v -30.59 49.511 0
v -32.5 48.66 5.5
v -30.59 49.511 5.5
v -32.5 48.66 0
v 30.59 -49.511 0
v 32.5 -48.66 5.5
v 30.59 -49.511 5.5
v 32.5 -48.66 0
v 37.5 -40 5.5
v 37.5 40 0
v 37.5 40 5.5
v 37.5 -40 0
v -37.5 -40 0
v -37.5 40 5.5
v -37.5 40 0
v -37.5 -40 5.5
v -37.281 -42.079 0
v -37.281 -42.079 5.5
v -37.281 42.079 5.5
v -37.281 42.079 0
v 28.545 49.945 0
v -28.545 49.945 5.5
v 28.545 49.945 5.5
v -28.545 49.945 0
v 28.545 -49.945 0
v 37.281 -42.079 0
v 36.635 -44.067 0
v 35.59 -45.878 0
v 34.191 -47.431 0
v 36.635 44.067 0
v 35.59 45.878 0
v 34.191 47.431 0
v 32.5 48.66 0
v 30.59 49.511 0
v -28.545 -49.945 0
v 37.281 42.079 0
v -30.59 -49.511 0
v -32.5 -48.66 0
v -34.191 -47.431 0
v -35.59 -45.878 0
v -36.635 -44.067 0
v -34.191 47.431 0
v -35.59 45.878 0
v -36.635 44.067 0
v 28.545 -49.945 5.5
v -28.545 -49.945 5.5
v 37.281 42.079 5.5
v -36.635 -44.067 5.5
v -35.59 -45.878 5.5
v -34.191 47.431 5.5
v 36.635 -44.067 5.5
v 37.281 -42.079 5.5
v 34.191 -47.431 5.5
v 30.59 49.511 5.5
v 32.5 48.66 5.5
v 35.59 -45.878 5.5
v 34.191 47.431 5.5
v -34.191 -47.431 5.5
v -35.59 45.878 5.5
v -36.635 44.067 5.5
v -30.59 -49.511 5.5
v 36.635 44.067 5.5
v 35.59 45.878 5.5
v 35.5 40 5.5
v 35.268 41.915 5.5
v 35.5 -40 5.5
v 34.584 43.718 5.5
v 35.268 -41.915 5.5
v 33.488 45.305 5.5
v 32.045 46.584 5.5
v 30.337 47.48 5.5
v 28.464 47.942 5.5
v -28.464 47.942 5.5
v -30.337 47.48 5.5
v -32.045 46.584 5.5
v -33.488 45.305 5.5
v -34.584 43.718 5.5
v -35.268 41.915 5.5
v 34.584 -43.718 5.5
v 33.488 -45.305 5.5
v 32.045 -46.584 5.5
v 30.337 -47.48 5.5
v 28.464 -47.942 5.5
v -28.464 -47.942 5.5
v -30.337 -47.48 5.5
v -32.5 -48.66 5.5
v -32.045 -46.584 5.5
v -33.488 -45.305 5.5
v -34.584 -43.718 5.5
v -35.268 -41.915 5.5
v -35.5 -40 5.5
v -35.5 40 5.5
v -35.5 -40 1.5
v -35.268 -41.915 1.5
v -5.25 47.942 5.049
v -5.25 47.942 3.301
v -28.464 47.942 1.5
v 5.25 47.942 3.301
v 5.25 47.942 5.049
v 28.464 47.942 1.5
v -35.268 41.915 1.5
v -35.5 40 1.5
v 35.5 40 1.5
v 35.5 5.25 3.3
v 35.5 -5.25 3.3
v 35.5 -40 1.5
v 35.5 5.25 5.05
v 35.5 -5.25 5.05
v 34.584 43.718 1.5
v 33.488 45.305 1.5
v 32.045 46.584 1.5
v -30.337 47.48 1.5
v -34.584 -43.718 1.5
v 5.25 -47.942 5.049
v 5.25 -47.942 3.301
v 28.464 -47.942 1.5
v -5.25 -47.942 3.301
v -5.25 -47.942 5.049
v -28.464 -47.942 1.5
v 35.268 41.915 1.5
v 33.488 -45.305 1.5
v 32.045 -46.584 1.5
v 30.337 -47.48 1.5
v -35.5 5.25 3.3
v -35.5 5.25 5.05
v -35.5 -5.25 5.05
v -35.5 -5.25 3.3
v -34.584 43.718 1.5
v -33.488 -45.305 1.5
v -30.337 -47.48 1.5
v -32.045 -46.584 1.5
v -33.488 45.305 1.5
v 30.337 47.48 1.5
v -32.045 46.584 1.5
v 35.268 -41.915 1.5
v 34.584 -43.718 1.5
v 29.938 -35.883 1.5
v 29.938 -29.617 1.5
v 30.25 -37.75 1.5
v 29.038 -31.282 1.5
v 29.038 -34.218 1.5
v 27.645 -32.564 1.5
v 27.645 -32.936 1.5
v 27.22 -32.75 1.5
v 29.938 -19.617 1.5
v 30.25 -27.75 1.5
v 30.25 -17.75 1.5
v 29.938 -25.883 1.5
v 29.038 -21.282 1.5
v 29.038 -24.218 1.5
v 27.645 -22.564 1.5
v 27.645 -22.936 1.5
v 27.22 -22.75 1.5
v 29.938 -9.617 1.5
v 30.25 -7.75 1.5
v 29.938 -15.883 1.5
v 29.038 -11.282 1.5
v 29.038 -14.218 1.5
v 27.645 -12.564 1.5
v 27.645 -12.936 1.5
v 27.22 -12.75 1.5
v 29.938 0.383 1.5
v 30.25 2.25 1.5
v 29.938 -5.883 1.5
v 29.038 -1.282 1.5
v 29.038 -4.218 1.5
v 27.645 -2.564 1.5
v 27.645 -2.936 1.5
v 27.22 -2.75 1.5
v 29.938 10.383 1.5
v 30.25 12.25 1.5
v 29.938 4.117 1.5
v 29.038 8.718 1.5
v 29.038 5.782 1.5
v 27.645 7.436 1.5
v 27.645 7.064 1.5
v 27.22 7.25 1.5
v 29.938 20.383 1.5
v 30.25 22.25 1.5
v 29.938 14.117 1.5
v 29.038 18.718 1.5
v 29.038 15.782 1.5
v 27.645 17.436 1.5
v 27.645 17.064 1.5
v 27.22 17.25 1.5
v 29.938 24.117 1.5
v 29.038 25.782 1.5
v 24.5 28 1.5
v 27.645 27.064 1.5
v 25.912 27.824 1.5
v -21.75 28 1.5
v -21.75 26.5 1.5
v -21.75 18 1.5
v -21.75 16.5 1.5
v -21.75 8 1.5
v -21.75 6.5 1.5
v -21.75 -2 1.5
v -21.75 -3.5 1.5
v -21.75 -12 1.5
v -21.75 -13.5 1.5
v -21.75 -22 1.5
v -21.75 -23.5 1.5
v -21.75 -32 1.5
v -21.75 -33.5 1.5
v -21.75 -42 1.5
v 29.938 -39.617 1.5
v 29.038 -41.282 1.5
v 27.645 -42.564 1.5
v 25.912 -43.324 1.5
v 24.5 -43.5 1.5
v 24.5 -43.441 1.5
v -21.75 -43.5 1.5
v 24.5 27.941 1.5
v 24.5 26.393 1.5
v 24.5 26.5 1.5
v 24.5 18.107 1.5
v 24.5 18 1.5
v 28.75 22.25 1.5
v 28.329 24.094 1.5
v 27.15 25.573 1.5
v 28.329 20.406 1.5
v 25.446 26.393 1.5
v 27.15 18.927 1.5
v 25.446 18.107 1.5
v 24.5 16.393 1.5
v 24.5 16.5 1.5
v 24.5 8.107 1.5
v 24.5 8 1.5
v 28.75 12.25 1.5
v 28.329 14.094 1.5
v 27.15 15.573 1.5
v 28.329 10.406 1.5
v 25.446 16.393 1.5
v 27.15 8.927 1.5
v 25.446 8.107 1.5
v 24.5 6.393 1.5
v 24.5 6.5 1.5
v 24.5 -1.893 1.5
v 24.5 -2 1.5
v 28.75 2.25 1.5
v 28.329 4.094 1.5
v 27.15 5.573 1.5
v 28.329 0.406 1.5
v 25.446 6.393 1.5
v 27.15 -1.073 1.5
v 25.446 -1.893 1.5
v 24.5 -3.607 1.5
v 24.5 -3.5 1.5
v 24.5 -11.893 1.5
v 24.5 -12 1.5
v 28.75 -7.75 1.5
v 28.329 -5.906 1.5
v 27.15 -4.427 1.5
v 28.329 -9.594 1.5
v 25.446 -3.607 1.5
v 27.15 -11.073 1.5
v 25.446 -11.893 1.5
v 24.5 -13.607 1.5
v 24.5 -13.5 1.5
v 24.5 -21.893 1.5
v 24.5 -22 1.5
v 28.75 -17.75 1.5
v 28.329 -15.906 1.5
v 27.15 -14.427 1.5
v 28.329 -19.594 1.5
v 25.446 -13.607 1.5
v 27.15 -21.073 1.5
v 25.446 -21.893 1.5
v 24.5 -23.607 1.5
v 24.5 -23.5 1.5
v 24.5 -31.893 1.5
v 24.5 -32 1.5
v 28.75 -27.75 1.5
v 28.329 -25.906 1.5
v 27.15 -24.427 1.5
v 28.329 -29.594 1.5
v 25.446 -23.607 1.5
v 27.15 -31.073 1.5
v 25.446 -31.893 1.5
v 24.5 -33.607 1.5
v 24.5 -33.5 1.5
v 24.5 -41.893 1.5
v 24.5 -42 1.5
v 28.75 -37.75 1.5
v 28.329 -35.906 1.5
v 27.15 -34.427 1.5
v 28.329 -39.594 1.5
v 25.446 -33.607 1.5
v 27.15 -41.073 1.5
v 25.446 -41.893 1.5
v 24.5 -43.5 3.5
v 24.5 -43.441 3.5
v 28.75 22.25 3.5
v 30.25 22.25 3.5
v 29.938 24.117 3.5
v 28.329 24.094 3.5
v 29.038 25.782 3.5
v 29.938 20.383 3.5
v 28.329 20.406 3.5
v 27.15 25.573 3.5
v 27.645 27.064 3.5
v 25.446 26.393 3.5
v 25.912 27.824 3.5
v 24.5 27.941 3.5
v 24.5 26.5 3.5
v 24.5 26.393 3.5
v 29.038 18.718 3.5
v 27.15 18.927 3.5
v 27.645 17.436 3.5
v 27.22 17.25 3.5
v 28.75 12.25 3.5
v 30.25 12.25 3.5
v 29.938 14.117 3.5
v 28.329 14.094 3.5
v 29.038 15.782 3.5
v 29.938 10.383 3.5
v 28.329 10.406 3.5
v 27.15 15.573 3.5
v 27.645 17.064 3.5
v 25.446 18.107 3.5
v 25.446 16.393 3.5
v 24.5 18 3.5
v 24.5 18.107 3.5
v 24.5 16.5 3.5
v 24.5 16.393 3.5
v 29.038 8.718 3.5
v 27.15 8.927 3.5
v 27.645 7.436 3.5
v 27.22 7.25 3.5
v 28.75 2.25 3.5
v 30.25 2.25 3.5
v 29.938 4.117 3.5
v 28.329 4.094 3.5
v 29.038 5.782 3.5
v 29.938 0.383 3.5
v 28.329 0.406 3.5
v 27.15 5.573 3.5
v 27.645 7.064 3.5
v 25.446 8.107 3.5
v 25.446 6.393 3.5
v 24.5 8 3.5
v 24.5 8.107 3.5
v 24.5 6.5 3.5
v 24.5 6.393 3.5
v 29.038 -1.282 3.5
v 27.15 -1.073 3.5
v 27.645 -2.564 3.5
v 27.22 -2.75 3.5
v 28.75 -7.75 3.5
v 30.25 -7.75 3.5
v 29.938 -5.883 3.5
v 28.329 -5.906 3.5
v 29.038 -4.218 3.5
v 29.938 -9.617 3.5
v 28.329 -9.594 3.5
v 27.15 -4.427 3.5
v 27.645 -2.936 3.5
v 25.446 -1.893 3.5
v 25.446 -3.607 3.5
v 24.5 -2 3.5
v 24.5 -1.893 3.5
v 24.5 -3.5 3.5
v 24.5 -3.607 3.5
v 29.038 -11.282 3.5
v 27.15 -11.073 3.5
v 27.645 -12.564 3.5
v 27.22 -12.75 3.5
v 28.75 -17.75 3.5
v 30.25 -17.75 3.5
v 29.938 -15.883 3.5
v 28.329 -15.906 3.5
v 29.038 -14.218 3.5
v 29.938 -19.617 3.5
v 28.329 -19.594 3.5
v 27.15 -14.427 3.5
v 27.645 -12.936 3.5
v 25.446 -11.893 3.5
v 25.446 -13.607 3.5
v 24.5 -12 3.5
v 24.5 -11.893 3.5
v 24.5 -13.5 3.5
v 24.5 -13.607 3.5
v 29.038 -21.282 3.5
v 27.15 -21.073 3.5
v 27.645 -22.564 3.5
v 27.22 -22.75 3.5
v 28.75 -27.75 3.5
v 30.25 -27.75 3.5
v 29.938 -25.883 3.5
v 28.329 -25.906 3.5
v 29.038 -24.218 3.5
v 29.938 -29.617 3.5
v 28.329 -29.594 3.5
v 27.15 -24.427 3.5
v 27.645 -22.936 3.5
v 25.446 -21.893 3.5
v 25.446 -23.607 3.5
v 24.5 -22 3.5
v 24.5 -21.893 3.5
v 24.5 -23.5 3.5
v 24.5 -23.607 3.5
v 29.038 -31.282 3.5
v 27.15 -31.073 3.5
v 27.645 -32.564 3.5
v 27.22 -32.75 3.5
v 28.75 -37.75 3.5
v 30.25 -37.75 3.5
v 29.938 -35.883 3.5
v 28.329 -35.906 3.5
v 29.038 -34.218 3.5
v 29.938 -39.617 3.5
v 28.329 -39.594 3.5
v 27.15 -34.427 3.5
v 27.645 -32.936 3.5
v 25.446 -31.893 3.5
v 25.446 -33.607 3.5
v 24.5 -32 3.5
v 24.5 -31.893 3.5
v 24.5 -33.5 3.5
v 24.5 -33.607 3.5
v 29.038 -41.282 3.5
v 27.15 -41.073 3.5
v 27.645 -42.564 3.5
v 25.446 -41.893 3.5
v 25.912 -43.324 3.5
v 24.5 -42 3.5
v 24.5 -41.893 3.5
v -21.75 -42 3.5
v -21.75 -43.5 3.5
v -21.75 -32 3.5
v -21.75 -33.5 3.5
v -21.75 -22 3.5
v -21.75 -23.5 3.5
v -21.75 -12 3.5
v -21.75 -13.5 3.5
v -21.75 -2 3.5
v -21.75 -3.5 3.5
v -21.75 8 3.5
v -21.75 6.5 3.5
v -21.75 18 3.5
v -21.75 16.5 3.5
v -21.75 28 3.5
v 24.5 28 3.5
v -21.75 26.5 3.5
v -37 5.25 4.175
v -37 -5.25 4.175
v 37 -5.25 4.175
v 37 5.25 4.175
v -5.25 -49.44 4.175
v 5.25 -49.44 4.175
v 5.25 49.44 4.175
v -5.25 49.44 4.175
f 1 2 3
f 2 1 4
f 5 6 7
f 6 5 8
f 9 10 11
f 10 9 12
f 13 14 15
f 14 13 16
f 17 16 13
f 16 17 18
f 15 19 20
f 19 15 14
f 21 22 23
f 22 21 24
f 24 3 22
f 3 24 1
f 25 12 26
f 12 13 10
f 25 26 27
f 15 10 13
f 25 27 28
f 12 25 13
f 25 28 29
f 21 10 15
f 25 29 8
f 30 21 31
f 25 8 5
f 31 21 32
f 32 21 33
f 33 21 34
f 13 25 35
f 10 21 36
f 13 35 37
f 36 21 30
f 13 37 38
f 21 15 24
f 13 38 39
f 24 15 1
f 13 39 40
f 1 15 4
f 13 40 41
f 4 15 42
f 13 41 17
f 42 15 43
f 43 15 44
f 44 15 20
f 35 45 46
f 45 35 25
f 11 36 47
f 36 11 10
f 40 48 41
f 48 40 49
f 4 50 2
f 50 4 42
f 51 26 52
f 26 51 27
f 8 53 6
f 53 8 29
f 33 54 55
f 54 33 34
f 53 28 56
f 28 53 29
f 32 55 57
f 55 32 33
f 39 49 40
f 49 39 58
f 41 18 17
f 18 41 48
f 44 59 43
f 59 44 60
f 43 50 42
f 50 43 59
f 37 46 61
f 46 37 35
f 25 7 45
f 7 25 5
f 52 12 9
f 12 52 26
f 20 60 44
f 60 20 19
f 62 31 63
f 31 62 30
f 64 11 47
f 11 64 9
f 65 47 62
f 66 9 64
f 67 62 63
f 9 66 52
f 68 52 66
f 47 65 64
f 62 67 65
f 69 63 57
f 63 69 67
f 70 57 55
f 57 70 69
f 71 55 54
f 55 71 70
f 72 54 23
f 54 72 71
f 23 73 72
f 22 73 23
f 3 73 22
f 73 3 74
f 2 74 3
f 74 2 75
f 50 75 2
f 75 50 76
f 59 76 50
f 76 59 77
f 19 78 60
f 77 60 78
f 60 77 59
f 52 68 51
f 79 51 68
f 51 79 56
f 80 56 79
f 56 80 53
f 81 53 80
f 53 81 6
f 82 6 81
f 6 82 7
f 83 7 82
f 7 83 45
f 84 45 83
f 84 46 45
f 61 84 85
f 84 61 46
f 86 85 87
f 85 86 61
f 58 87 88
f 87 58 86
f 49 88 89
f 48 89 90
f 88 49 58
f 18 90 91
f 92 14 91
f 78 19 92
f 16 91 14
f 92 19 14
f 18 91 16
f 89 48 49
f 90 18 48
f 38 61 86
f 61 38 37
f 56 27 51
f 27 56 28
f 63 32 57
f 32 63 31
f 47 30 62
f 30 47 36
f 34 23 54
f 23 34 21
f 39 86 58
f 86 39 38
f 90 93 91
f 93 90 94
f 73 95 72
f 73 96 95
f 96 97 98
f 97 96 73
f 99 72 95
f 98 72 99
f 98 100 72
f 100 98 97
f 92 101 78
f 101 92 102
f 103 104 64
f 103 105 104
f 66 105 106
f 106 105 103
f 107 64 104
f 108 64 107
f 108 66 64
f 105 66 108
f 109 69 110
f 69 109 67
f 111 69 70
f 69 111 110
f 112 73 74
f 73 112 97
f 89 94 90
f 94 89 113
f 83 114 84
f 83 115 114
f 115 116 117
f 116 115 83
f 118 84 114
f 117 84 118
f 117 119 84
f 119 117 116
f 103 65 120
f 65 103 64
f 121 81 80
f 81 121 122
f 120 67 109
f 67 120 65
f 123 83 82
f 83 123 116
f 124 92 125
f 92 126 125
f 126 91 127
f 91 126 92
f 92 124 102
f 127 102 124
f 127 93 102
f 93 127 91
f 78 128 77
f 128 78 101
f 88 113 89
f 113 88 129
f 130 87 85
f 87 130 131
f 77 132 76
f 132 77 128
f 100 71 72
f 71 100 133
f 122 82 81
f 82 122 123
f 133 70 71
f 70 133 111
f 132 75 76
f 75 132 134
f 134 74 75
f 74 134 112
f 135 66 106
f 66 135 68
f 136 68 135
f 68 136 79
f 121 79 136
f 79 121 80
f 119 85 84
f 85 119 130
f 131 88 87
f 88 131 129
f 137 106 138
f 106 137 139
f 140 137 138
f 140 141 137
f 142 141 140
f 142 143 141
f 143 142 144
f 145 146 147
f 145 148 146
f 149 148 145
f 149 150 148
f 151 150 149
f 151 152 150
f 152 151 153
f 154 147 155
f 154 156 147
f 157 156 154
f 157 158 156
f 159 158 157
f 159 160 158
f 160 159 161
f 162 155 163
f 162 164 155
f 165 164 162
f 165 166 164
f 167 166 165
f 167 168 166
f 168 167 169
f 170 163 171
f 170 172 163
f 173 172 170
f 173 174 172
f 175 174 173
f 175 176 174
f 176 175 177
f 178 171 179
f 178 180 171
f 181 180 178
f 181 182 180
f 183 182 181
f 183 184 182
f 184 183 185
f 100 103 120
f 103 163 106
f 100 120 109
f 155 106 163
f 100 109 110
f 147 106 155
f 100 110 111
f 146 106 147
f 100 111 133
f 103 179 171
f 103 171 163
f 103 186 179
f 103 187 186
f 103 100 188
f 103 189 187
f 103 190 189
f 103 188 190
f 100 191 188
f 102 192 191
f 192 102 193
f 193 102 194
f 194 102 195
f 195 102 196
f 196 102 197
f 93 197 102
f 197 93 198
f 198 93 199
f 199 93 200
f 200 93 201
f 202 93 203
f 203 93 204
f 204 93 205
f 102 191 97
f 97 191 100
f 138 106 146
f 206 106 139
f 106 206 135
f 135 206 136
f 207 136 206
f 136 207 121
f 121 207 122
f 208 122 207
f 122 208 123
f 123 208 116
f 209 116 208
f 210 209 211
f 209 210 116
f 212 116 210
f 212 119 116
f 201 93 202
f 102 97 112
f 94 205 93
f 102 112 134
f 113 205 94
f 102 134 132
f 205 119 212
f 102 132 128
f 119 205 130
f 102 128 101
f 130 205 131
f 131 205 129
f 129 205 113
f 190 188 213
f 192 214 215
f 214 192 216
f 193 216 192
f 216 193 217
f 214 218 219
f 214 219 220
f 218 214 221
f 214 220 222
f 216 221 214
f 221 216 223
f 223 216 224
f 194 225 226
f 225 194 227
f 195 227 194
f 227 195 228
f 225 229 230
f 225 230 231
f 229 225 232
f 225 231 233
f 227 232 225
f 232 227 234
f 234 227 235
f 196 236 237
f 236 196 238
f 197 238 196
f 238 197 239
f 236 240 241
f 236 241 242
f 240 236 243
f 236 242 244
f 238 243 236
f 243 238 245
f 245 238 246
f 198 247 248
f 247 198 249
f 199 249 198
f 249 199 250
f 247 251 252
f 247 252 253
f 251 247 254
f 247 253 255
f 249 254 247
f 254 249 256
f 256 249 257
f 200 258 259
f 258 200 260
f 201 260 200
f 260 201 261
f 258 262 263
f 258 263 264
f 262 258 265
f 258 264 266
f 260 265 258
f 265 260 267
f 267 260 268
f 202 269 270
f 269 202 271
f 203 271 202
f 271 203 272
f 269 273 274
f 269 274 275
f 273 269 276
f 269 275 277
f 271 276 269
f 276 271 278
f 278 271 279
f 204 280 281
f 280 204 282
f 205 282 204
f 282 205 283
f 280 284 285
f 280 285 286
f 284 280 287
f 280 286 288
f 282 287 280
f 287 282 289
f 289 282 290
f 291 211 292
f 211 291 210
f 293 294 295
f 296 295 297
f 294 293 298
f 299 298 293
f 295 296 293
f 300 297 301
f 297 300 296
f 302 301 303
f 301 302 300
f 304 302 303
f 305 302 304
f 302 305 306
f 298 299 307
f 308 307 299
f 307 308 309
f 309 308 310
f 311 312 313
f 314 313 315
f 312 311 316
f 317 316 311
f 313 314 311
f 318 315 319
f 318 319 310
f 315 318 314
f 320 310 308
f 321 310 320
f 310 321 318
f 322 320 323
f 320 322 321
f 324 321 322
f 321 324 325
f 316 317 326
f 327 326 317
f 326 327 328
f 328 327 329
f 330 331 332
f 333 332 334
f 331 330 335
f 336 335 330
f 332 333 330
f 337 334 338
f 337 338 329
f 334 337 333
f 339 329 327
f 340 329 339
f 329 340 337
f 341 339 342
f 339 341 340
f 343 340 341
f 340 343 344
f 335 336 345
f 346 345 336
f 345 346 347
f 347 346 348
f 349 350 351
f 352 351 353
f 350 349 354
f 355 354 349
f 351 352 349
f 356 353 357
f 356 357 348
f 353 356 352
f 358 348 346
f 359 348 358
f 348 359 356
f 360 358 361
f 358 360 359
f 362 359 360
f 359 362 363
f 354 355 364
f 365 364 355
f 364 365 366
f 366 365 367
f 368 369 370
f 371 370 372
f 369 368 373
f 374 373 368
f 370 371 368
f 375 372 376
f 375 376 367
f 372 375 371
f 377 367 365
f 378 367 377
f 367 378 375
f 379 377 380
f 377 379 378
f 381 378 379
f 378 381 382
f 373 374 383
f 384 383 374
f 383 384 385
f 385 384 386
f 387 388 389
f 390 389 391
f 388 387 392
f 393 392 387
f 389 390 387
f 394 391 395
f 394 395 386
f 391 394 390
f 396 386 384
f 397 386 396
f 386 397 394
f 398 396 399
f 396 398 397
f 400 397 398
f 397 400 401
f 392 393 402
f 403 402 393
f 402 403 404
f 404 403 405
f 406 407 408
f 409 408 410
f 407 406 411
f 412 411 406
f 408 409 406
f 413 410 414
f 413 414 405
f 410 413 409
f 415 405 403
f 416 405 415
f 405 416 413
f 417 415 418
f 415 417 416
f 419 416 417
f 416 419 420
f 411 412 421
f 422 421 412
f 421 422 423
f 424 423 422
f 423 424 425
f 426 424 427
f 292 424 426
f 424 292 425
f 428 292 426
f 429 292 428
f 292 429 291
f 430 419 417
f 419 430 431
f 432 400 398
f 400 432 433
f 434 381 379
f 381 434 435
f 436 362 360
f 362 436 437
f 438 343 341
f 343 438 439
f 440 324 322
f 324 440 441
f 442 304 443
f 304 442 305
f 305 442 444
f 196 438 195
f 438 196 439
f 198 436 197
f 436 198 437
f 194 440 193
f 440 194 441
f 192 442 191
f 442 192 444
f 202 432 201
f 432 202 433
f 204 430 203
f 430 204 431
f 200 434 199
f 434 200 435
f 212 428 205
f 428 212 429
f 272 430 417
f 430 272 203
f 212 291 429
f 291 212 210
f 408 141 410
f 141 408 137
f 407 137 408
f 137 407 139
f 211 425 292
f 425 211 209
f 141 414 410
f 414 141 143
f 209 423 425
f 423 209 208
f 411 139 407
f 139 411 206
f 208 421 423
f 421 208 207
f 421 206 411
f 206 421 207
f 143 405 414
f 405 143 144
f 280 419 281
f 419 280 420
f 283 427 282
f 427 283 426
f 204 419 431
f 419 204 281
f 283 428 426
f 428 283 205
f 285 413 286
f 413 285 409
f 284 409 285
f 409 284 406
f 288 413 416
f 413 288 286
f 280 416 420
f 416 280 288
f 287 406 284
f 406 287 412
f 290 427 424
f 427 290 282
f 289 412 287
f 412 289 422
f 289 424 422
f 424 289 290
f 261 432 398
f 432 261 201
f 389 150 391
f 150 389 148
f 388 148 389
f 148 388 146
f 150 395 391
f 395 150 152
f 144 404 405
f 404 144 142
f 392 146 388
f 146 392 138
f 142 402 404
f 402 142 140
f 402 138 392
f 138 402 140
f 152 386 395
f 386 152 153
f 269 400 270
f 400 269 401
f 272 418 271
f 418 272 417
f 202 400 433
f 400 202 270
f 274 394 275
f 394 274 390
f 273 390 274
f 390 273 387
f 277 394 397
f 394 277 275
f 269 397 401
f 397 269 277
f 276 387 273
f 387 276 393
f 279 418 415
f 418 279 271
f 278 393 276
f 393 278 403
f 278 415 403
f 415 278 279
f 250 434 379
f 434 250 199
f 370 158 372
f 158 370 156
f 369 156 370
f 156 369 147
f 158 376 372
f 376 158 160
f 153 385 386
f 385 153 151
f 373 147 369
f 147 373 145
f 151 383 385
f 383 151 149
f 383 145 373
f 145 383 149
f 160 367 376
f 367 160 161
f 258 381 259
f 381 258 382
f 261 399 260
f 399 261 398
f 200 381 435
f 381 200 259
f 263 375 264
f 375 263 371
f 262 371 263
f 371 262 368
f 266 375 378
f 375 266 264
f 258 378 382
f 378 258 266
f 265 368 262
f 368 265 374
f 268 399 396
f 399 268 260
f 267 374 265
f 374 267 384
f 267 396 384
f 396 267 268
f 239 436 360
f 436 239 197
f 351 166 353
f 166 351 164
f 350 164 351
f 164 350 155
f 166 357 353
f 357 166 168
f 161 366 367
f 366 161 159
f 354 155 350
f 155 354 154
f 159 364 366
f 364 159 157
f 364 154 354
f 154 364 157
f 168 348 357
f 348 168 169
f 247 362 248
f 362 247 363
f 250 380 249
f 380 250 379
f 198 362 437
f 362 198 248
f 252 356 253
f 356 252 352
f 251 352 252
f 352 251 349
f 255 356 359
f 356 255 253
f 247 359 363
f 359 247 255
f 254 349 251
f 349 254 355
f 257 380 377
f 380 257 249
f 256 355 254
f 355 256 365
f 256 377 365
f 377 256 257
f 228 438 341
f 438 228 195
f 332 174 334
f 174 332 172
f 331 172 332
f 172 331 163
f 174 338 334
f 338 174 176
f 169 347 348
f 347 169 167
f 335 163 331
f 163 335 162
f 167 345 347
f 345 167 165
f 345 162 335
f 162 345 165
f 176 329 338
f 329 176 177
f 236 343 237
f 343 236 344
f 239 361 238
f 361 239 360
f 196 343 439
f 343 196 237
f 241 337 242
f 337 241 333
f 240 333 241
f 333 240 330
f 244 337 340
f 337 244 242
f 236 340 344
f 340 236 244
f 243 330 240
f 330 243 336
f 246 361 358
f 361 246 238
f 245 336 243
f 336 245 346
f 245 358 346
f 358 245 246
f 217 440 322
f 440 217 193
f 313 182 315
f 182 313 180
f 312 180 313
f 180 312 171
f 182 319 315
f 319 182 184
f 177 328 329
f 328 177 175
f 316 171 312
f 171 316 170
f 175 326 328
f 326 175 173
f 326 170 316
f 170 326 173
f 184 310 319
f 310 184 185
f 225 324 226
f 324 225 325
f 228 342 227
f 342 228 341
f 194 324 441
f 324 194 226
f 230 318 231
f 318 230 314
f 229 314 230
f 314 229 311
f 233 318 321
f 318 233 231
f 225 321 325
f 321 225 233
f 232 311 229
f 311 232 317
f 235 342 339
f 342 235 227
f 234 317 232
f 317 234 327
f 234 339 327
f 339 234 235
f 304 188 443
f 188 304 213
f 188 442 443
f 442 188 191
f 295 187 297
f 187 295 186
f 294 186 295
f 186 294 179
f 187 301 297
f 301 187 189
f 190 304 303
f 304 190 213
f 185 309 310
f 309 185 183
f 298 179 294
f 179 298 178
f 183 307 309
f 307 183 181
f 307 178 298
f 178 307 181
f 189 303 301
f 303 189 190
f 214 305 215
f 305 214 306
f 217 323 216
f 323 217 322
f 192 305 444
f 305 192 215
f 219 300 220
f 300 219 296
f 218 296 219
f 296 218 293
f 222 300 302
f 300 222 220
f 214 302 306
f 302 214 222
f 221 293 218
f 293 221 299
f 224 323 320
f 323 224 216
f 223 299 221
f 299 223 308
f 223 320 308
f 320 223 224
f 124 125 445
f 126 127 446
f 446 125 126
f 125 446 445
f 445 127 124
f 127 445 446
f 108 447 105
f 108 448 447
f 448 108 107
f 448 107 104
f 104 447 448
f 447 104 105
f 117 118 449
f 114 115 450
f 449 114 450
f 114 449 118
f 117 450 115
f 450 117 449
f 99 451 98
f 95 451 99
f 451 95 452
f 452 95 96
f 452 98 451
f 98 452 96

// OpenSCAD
//$fn=50;
L = 100; //Length of the plate, original = 100
W = 75; //Width of the plate, original = 75
H = 5.5; //Total Height, original = 5.5
wt = 2; //Wall thickness, original = 2

module base_outer(){
    translate([0,0,H/4]){
        minkowski(){
            cube([W-2*10,L-2*10,H/2],center=true);//75mmx105mm
            cylinder(r=10, h=H/2);
        }
    }
}
module base_inner(){
    translate([0,0,H/4+1.5]){
        minkowski(){
            cube([W-2*wt-2*8,L-2*wt-2*8,H/2],center=true);
            cylinder(r=8, h=H/2);
        }
    }
}
module baseplate(){ //Subtract inner from outer base
difference(){
    base_outer();
    base_inner();
}
}
module track_outer(){  
translate([0,0,1.5]){
union(){
cube([34.25+12,11.5,2]);
translate([0,11.5/2,0]){
    cylinder(r=11.5/2,h=2);
}
translate([34.25+12,11.5/2,0]){
    cylinder(r=11.5/2,h=2);
}
}
}
}
module track_inner(){  
translate([0,1.5,1.5]){
union(){
cube([34.25+12,8.5,2.5]);
translate([0,8.5/2,0]){
    cylinder(r=8.5/2,h=2.5);
}
translate([34.25+12,8.5/2,0]){
    cylinder(r=8.5/2,h=2.5);
}
}
}
}
module track(x,y){  //Subtract inner from outer track
    translate([x,y,0]){
difference(){
track_outer();
track_inner();
}
}
}
module tracks(){    //Combine 7 tracks
    
    union(){
    track(0,0);
    track(0,11.5-1.5);
    track(0,11.5*2-1.5*2);
    track(0,11.5*3-1.5*3);
    track(0,11.5*4-1.5*4);
    track(0,11.5*5-1.5*5);
    track(0,11.5*6-1.5*6);
    }
}
module track_sub(){ //Open left end of all tracks
    translate([-8.5,0,0]){
    cube([8.5,75,5]);
}
}
module tracks_final(x,y){ //Position all tracks
    translate([x,y,0]){
        difference(){
        tracks();
        track_sub();
    }
}
}
module base_tracks(){   //Combine tracks to baseplate
    union(){
        baseplate();
        tracks_final(W/2-46.25-13,-L/2+6.5);
    }
}

module tab(angle){  //Create triangular tabs    
rotate(a=angle, v=[0,0,1]){
rotate(a=-90, v=[0,1,0]){
rotate(a=90, v=[1,0,0]){
 linear_extrude(height = 10.5, center = true, convexity = 10, twist = 0, slices = 100, scale = 1.0) {
 polygon(points=[[0,0],[1.75/2,1.5],[1.75,0]]);
 }
 }
 }
 }
 }
module tabs(){      //Position all tabs
     
 translate([-W/2+wt,0,H-2.2]){
 tab(0);
 }
 
translate([W/2-wt,0,H-2.2]){
    tab(180);
}
translate([0,-L/2+wt+0.06,H-2.2]){
    tab(90);
}

translate([0,L/2-wt-0.06,H-2.2]){
    tab(270);
}
}
module final(){     //Subtract tabs from baseplate
difference(){
base_tracks();
tabs();
}
}
final();
    
    
    
    
    
    
    
    
    
    
    
